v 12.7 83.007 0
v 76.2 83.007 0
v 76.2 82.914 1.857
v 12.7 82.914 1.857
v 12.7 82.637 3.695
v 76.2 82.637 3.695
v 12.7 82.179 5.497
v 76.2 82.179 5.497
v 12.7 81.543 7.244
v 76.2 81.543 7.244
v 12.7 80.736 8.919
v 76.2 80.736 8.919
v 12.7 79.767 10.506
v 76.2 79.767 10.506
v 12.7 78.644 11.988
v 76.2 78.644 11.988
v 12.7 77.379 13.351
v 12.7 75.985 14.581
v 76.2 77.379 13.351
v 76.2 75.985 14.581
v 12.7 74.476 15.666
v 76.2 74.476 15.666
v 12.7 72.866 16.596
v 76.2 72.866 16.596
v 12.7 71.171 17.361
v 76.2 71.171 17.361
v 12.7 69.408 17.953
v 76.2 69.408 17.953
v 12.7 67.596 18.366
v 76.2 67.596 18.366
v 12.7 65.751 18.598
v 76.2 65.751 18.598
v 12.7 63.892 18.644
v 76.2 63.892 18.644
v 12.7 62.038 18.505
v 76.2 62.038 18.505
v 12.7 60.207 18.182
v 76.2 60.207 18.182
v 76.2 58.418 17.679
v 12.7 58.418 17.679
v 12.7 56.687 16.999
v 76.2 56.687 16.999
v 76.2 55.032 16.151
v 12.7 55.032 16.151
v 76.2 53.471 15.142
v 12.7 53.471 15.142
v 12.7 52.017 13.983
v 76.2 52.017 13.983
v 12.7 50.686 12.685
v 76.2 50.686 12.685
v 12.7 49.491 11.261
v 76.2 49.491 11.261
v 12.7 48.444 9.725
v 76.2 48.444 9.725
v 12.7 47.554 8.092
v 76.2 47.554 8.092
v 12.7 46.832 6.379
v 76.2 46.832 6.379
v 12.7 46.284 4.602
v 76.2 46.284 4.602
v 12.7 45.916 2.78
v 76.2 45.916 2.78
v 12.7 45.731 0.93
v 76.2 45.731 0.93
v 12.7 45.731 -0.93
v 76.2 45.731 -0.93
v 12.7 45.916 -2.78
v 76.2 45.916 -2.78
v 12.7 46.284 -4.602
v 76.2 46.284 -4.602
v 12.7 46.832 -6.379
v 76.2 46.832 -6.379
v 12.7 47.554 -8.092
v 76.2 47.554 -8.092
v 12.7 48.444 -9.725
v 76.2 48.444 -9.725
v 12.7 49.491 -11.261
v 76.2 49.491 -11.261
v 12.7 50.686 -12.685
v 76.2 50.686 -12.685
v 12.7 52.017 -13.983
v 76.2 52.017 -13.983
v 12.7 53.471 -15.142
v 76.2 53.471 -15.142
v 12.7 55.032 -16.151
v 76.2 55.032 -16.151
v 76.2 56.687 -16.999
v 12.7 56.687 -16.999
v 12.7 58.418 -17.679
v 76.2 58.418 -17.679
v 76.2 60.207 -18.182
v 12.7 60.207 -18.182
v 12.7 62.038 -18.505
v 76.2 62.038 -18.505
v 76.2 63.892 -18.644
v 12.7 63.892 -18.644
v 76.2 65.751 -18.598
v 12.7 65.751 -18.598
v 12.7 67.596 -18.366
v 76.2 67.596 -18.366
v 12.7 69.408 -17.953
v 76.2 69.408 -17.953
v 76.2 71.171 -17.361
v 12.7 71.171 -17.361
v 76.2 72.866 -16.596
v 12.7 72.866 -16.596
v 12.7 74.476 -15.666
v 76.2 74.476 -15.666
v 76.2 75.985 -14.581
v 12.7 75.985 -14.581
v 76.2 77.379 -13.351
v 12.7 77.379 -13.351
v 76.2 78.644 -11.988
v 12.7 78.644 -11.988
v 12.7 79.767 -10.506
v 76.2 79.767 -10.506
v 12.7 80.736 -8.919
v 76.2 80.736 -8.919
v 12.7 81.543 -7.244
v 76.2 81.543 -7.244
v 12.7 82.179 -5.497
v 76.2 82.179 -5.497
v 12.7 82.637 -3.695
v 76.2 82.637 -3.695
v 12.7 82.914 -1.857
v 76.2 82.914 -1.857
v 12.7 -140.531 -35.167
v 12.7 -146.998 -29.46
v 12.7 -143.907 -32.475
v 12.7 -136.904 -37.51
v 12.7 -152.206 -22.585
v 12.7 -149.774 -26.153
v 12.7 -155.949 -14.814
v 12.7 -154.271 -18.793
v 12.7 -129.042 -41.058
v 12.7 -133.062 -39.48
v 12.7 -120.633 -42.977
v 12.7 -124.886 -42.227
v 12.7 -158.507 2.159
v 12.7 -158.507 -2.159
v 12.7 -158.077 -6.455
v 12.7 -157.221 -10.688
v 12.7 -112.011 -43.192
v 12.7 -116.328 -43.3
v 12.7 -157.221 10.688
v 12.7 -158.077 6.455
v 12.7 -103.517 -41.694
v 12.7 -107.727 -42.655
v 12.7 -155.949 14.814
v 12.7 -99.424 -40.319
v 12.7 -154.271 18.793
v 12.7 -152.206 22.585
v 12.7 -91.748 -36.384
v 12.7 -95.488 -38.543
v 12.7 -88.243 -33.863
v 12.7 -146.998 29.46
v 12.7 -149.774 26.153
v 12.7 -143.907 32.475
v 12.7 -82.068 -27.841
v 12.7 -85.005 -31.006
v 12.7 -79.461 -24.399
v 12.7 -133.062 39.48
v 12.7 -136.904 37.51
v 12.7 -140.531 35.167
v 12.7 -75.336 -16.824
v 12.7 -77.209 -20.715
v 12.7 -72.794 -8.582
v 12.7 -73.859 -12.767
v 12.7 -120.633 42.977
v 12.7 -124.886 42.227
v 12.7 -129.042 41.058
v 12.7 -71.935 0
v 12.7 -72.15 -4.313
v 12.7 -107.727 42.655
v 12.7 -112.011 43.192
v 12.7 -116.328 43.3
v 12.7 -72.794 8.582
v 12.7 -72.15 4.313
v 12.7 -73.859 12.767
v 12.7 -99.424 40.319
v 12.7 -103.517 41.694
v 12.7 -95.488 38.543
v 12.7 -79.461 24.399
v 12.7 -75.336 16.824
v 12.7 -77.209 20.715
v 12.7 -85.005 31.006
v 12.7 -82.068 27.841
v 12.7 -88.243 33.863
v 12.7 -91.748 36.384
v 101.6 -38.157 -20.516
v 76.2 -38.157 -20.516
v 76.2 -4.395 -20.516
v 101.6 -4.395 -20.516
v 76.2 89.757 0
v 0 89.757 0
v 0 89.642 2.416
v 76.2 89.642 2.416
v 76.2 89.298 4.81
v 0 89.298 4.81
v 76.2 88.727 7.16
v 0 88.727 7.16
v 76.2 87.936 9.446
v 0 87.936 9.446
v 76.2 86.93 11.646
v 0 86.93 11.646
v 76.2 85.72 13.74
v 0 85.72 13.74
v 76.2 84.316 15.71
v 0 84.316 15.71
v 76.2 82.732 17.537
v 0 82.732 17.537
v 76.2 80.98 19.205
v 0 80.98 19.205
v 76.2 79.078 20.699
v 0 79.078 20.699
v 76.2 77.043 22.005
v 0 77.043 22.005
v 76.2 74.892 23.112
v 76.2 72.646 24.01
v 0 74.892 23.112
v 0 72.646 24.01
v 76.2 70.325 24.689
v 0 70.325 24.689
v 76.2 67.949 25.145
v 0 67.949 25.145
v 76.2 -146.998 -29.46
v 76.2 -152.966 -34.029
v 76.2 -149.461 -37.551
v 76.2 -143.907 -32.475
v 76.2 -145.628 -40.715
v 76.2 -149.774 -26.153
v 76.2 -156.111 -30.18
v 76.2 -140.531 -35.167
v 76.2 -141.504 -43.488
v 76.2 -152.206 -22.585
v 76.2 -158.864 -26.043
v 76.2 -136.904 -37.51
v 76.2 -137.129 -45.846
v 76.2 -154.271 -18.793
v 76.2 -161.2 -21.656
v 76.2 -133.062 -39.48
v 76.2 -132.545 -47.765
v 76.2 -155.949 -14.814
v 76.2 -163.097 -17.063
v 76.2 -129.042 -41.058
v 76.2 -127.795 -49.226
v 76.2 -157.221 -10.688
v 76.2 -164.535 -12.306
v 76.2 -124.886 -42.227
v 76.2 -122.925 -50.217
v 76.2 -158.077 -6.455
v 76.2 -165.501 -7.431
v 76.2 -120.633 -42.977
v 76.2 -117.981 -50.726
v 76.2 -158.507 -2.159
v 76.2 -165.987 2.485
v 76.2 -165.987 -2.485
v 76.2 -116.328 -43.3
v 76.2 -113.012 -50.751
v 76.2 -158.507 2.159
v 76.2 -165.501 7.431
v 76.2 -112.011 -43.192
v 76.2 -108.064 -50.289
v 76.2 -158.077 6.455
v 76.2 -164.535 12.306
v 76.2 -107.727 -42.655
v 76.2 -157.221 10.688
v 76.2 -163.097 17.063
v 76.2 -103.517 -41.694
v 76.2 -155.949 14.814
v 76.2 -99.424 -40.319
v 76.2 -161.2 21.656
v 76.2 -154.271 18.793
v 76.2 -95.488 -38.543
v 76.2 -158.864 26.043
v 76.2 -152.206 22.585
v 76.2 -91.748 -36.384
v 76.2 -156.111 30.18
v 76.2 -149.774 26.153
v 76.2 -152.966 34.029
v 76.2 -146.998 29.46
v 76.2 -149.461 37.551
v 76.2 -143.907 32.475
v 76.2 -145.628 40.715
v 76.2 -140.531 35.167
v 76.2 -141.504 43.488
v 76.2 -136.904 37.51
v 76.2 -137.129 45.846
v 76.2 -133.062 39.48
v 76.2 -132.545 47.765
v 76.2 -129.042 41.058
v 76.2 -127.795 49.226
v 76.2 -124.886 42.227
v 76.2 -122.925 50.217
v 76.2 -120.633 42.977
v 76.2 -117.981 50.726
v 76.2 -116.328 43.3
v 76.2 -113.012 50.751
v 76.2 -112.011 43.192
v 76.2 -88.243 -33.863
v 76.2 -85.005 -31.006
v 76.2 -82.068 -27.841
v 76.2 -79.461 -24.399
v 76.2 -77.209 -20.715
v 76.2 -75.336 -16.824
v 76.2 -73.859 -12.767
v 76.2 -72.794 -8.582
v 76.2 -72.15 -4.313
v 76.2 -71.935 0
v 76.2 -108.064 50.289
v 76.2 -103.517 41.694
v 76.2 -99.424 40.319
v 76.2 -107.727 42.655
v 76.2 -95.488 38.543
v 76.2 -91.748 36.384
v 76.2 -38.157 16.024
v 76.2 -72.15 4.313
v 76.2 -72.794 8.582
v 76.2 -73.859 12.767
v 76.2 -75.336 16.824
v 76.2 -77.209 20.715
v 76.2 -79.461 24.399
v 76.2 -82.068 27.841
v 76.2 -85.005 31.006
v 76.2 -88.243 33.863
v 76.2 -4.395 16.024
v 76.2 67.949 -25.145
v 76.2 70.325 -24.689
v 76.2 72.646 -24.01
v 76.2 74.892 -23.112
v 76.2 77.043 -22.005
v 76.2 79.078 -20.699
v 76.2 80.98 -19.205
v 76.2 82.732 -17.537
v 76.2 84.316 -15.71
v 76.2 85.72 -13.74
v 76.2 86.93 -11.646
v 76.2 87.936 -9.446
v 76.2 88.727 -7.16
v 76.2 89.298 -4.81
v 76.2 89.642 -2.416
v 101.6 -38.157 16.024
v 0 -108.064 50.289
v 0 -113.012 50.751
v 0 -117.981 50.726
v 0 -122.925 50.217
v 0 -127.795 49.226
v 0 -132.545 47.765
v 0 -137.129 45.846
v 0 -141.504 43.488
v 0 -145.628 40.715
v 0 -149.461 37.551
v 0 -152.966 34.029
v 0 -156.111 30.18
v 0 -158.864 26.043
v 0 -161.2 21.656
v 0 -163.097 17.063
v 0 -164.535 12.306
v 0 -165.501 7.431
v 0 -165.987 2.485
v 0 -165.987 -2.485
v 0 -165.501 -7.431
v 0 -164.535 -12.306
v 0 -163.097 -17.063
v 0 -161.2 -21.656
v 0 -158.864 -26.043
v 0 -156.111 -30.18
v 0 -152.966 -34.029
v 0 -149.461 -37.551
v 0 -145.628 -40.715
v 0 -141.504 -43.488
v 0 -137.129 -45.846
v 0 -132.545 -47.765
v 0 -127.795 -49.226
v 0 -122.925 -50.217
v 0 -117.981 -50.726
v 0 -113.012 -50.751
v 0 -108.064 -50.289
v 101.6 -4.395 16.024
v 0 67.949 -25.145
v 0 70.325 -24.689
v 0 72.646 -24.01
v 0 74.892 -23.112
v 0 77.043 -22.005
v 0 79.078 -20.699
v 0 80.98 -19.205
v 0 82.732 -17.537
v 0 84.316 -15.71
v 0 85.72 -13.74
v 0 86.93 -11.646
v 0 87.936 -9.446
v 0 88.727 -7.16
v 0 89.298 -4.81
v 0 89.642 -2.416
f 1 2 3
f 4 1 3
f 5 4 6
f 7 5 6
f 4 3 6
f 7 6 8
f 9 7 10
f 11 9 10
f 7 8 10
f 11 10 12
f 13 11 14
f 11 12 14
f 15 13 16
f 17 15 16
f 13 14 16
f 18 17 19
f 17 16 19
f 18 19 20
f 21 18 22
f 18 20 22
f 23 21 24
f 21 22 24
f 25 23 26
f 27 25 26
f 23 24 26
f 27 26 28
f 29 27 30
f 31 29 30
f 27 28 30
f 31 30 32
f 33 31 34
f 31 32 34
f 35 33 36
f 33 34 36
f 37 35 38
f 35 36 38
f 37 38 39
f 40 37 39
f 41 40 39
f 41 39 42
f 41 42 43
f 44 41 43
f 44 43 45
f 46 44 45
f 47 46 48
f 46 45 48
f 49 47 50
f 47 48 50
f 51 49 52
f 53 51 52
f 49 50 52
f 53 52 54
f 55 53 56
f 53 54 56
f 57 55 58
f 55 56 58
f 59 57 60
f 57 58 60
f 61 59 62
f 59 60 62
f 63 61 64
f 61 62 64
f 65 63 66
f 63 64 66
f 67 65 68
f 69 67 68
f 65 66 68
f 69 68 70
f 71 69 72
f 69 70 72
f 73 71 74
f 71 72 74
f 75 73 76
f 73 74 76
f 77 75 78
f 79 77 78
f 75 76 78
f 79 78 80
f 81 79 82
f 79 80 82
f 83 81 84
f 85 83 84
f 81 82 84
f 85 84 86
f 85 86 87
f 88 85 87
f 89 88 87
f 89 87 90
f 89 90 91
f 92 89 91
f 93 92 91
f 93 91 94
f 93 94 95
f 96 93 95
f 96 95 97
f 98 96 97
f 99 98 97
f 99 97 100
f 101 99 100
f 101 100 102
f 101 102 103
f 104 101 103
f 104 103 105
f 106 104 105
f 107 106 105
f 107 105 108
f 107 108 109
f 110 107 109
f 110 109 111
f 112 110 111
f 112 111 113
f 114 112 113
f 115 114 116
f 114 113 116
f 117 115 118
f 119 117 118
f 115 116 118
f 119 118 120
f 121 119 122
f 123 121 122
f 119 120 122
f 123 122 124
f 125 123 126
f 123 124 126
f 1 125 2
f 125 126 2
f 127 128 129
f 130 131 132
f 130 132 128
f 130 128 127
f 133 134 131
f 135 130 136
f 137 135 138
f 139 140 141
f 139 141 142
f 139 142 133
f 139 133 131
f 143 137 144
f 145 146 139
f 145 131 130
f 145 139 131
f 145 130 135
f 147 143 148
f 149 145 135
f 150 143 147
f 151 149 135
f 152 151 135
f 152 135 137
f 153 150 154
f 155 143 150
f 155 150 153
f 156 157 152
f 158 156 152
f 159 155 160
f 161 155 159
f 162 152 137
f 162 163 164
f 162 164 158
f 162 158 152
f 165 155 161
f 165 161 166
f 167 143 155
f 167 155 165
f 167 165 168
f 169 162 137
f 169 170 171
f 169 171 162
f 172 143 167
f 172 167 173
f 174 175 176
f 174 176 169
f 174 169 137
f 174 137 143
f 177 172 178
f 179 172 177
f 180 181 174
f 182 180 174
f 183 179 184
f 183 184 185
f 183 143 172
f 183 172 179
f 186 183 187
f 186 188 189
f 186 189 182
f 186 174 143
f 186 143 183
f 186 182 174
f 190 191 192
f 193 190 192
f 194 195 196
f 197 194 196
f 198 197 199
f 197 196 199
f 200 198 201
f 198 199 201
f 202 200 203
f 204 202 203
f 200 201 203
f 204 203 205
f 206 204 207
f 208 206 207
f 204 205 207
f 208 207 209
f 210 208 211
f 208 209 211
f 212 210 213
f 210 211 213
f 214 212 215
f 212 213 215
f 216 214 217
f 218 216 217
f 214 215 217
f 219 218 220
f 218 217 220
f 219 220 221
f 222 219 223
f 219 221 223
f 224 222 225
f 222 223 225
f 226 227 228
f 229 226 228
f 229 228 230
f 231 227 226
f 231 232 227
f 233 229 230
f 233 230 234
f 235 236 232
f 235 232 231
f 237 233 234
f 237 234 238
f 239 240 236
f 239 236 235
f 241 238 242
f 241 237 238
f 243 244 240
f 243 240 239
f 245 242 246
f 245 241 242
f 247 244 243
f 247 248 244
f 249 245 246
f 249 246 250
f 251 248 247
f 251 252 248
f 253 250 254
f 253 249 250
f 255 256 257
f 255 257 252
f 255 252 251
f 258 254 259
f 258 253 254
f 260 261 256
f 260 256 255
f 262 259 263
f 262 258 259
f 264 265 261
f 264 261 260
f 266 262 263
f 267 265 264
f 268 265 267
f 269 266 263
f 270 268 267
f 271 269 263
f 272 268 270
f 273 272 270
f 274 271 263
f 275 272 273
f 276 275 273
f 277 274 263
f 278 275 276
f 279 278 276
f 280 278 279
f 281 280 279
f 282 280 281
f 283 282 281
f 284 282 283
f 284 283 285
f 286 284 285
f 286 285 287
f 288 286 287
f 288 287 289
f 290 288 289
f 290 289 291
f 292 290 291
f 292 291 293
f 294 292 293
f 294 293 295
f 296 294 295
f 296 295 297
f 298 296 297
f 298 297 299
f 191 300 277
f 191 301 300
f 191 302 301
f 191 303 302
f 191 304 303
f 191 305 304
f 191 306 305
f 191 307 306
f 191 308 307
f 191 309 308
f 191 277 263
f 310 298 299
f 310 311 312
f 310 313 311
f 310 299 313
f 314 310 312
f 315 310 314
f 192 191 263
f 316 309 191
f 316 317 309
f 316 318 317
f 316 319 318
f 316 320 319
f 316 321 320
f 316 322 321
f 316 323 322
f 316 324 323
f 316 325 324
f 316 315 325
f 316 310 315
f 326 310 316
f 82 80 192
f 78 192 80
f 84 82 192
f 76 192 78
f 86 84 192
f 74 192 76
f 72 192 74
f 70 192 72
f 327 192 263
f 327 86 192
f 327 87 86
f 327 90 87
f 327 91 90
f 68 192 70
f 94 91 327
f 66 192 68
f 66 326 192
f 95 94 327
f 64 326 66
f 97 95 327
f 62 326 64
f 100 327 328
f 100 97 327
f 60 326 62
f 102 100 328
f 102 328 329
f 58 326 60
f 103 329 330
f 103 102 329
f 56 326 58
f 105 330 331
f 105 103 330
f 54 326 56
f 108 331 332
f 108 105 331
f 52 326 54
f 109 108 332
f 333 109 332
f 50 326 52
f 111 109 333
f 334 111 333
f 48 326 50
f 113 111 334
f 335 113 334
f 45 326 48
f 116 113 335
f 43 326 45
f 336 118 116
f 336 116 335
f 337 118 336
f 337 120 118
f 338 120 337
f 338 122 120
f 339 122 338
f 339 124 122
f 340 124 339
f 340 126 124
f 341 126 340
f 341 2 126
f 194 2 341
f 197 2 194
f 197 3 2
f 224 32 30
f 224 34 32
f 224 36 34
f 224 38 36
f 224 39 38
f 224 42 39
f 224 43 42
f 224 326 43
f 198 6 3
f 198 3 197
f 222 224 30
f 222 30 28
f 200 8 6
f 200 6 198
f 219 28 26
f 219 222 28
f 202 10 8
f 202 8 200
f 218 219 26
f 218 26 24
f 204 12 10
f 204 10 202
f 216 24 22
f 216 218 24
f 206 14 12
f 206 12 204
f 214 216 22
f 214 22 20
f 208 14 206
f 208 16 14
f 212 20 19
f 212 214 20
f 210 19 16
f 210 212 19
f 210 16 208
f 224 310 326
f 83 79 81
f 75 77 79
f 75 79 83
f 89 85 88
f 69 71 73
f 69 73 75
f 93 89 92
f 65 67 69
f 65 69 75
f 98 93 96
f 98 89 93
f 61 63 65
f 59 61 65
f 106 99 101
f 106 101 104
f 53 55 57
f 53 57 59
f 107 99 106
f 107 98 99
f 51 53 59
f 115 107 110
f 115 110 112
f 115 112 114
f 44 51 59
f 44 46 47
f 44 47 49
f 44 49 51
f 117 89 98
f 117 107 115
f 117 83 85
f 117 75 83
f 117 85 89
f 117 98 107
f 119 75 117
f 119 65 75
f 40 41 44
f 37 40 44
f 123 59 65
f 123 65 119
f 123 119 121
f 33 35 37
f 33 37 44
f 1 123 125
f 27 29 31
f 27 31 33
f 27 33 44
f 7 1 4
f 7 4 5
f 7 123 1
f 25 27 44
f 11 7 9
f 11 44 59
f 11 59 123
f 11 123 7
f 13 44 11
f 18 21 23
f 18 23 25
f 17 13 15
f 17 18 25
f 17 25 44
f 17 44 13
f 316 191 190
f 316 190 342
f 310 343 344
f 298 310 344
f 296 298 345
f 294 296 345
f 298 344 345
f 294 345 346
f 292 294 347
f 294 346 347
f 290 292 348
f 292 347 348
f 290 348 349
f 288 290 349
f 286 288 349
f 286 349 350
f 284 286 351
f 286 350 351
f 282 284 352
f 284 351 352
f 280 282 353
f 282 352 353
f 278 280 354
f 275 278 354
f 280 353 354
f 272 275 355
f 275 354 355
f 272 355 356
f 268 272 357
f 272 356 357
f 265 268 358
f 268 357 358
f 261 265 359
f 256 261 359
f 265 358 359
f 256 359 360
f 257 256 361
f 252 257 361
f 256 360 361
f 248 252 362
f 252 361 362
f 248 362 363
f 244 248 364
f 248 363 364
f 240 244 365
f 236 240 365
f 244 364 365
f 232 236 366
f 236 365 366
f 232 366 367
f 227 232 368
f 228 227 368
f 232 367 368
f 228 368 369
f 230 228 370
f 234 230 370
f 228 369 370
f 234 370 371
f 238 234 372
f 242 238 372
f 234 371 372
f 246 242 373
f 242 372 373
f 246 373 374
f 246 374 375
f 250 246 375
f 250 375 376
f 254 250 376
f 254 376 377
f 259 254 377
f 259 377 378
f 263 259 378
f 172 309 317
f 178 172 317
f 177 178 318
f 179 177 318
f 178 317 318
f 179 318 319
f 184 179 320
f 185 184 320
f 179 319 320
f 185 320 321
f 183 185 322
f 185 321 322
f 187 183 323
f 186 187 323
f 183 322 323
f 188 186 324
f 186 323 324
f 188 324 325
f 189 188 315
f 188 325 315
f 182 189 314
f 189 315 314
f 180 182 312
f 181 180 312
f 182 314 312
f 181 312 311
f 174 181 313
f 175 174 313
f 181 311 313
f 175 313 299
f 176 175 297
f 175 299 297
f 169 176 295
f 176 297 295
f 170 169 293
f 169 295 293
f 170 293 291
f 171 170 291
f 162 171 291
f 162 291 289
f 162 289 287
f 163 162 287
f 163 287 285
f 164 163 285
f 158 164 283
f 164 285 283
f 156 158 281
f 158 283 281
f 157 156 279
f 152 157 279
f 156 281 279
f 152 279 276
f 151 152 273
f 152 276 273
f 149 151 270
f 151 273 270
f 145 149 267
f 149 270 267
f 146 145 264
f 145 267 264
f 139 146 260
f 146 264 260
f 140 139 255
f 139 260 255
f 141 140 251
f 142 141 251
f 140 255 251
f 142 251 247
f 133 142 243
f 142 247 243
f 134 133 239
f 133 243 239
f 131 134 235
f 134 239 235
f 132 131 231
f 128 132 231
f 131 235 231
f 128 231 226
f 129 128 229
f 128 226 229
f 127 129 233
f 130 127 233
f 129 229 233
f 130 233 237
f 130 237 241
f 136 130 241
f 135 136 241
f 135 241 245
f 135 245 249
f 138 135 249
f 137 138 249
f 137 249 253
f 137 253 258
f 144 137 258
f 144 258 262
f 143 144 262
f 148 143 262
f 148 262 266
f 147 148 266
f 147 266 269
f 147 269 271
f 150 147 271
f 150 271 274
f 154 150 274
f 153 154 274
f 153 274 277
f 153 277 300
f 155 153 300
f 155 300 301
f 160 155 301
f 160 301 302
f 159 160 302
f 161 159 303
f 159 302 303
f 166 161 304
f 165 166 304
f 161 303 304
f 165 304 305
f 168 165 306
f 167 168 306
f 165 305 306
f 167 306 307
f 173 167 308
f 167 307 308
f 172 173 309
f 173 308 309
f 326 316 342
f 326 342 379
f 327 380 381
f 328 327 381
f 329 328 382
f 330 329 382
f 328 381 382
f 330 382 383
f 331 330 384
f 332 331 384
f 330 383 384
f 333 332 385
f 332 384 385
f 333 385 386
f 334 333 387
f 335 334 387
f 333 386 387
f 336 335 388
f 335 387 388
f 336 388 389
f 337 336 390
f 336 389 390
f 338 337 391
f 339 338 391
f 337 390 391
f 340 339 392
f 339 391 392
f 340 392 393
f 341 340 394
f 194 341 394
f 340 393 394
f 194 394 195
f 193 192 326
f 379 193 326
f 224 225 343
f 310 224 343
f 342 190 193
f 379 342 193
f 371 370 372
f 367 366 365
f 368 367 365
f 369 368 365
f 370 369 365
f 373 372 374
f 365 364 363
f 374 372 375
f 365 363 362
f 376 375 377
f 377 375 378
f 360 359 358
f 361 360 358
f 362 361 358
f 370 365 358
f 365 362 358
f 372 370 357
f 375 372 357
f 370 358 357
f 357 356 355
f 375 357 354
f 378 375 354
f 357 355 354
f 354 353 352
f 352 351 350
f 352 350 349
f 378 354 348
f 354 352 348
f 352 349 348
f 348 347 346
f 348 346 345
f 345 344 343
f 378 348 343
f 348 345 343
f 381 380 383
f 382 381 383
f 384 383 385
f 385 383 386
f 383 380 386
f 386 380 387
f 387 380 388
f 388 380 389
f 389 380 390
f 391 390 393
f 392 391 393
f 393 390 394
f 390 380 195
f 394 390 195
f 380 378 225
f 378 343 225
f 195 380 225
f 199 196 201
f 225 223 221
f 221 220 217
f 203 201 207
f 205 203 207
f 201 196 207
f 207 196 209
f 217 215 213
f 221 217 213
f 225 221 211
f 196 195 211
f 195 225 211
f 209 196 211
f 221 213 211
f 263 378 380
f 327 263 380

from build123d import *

# Parameters (mm, degrees)
F1_DEPTH = 76.2
F2_R     = 43.31301
F2_R_2   = 18.649778
F3_DEPTH = 63.5
F4_W     = 33.762566
F4_H     = 36.540501
F5_DEPTH = 25.4


with BuildPart() as f1:
    # F0 (on Right) → F1 (new body)
    with BuildSketch(Plane.YZ):
        with BuildLine():
            ThreePointArc((-108.063558, -50.289434), (-76.870702, -33.284248), (-64.447763, 0))
            ThreePointArc((-64.447763, 0), (-76.870702, 33.284248), (-108.063558, 50.289434))
            ThreePointArc((-108.063558, 50.289434), (-166.047763, 0), (-108.063558, -50.289434))
        make_face()
        with BuildLine():
            ThreePointArc((-108.063558, 50.289434), (-76.870702, 33.284248), (-64.447763, 0))
            ThreePointArc((-64.447763, 0), (-76.870702, -33.284248), (-108.063558, -50.289434))
            Line((-108.063558, -50.289434), (67.949462, -25.144717))
            ThreePointArc((67.949462, -25.144717), (38.957359, 0), (67.949462, 25.144717))
            Line((67.949462, 25.144717), (-108.063558, 50.289434))
        make_face()
        with BuildLine():
            ThreePointArc((89.757359, 0), (83.54589, 16.642124), (67.949462, 25.144717))
            ThreePointArc((67.949462, 25.144717), (38.957359, 0), (67.949462, -25.144717))
            ThreePointArc((67.949462, -25.144717), (83.54589, -16.642124), (89.757359, 0))
        make_face()
    extrude(amount=F1_DEPTH)

    # F2 (on face) → F3 (cut)
    with BuildSketch(Plane.YZ.offset(76.2)):
        with Locations((-115.247763, 0)):
            Circle(F2_R)
        with Locations((64.357359, 0)):
            Circle(F2_R_2)
    extrude(amount=-F3_DEPTH, mode=Mode.SUBTRACT)

    # F4 (on face) → F5 (join)
    with BuildSketch(Plane.YZ.offset(76.2)):
        with Locations((-21.275819, -2.24594)):
            Rectangle(F4_W, F4_H)
    extrude(amount=F5_DEPTH)


solid = f1.part
